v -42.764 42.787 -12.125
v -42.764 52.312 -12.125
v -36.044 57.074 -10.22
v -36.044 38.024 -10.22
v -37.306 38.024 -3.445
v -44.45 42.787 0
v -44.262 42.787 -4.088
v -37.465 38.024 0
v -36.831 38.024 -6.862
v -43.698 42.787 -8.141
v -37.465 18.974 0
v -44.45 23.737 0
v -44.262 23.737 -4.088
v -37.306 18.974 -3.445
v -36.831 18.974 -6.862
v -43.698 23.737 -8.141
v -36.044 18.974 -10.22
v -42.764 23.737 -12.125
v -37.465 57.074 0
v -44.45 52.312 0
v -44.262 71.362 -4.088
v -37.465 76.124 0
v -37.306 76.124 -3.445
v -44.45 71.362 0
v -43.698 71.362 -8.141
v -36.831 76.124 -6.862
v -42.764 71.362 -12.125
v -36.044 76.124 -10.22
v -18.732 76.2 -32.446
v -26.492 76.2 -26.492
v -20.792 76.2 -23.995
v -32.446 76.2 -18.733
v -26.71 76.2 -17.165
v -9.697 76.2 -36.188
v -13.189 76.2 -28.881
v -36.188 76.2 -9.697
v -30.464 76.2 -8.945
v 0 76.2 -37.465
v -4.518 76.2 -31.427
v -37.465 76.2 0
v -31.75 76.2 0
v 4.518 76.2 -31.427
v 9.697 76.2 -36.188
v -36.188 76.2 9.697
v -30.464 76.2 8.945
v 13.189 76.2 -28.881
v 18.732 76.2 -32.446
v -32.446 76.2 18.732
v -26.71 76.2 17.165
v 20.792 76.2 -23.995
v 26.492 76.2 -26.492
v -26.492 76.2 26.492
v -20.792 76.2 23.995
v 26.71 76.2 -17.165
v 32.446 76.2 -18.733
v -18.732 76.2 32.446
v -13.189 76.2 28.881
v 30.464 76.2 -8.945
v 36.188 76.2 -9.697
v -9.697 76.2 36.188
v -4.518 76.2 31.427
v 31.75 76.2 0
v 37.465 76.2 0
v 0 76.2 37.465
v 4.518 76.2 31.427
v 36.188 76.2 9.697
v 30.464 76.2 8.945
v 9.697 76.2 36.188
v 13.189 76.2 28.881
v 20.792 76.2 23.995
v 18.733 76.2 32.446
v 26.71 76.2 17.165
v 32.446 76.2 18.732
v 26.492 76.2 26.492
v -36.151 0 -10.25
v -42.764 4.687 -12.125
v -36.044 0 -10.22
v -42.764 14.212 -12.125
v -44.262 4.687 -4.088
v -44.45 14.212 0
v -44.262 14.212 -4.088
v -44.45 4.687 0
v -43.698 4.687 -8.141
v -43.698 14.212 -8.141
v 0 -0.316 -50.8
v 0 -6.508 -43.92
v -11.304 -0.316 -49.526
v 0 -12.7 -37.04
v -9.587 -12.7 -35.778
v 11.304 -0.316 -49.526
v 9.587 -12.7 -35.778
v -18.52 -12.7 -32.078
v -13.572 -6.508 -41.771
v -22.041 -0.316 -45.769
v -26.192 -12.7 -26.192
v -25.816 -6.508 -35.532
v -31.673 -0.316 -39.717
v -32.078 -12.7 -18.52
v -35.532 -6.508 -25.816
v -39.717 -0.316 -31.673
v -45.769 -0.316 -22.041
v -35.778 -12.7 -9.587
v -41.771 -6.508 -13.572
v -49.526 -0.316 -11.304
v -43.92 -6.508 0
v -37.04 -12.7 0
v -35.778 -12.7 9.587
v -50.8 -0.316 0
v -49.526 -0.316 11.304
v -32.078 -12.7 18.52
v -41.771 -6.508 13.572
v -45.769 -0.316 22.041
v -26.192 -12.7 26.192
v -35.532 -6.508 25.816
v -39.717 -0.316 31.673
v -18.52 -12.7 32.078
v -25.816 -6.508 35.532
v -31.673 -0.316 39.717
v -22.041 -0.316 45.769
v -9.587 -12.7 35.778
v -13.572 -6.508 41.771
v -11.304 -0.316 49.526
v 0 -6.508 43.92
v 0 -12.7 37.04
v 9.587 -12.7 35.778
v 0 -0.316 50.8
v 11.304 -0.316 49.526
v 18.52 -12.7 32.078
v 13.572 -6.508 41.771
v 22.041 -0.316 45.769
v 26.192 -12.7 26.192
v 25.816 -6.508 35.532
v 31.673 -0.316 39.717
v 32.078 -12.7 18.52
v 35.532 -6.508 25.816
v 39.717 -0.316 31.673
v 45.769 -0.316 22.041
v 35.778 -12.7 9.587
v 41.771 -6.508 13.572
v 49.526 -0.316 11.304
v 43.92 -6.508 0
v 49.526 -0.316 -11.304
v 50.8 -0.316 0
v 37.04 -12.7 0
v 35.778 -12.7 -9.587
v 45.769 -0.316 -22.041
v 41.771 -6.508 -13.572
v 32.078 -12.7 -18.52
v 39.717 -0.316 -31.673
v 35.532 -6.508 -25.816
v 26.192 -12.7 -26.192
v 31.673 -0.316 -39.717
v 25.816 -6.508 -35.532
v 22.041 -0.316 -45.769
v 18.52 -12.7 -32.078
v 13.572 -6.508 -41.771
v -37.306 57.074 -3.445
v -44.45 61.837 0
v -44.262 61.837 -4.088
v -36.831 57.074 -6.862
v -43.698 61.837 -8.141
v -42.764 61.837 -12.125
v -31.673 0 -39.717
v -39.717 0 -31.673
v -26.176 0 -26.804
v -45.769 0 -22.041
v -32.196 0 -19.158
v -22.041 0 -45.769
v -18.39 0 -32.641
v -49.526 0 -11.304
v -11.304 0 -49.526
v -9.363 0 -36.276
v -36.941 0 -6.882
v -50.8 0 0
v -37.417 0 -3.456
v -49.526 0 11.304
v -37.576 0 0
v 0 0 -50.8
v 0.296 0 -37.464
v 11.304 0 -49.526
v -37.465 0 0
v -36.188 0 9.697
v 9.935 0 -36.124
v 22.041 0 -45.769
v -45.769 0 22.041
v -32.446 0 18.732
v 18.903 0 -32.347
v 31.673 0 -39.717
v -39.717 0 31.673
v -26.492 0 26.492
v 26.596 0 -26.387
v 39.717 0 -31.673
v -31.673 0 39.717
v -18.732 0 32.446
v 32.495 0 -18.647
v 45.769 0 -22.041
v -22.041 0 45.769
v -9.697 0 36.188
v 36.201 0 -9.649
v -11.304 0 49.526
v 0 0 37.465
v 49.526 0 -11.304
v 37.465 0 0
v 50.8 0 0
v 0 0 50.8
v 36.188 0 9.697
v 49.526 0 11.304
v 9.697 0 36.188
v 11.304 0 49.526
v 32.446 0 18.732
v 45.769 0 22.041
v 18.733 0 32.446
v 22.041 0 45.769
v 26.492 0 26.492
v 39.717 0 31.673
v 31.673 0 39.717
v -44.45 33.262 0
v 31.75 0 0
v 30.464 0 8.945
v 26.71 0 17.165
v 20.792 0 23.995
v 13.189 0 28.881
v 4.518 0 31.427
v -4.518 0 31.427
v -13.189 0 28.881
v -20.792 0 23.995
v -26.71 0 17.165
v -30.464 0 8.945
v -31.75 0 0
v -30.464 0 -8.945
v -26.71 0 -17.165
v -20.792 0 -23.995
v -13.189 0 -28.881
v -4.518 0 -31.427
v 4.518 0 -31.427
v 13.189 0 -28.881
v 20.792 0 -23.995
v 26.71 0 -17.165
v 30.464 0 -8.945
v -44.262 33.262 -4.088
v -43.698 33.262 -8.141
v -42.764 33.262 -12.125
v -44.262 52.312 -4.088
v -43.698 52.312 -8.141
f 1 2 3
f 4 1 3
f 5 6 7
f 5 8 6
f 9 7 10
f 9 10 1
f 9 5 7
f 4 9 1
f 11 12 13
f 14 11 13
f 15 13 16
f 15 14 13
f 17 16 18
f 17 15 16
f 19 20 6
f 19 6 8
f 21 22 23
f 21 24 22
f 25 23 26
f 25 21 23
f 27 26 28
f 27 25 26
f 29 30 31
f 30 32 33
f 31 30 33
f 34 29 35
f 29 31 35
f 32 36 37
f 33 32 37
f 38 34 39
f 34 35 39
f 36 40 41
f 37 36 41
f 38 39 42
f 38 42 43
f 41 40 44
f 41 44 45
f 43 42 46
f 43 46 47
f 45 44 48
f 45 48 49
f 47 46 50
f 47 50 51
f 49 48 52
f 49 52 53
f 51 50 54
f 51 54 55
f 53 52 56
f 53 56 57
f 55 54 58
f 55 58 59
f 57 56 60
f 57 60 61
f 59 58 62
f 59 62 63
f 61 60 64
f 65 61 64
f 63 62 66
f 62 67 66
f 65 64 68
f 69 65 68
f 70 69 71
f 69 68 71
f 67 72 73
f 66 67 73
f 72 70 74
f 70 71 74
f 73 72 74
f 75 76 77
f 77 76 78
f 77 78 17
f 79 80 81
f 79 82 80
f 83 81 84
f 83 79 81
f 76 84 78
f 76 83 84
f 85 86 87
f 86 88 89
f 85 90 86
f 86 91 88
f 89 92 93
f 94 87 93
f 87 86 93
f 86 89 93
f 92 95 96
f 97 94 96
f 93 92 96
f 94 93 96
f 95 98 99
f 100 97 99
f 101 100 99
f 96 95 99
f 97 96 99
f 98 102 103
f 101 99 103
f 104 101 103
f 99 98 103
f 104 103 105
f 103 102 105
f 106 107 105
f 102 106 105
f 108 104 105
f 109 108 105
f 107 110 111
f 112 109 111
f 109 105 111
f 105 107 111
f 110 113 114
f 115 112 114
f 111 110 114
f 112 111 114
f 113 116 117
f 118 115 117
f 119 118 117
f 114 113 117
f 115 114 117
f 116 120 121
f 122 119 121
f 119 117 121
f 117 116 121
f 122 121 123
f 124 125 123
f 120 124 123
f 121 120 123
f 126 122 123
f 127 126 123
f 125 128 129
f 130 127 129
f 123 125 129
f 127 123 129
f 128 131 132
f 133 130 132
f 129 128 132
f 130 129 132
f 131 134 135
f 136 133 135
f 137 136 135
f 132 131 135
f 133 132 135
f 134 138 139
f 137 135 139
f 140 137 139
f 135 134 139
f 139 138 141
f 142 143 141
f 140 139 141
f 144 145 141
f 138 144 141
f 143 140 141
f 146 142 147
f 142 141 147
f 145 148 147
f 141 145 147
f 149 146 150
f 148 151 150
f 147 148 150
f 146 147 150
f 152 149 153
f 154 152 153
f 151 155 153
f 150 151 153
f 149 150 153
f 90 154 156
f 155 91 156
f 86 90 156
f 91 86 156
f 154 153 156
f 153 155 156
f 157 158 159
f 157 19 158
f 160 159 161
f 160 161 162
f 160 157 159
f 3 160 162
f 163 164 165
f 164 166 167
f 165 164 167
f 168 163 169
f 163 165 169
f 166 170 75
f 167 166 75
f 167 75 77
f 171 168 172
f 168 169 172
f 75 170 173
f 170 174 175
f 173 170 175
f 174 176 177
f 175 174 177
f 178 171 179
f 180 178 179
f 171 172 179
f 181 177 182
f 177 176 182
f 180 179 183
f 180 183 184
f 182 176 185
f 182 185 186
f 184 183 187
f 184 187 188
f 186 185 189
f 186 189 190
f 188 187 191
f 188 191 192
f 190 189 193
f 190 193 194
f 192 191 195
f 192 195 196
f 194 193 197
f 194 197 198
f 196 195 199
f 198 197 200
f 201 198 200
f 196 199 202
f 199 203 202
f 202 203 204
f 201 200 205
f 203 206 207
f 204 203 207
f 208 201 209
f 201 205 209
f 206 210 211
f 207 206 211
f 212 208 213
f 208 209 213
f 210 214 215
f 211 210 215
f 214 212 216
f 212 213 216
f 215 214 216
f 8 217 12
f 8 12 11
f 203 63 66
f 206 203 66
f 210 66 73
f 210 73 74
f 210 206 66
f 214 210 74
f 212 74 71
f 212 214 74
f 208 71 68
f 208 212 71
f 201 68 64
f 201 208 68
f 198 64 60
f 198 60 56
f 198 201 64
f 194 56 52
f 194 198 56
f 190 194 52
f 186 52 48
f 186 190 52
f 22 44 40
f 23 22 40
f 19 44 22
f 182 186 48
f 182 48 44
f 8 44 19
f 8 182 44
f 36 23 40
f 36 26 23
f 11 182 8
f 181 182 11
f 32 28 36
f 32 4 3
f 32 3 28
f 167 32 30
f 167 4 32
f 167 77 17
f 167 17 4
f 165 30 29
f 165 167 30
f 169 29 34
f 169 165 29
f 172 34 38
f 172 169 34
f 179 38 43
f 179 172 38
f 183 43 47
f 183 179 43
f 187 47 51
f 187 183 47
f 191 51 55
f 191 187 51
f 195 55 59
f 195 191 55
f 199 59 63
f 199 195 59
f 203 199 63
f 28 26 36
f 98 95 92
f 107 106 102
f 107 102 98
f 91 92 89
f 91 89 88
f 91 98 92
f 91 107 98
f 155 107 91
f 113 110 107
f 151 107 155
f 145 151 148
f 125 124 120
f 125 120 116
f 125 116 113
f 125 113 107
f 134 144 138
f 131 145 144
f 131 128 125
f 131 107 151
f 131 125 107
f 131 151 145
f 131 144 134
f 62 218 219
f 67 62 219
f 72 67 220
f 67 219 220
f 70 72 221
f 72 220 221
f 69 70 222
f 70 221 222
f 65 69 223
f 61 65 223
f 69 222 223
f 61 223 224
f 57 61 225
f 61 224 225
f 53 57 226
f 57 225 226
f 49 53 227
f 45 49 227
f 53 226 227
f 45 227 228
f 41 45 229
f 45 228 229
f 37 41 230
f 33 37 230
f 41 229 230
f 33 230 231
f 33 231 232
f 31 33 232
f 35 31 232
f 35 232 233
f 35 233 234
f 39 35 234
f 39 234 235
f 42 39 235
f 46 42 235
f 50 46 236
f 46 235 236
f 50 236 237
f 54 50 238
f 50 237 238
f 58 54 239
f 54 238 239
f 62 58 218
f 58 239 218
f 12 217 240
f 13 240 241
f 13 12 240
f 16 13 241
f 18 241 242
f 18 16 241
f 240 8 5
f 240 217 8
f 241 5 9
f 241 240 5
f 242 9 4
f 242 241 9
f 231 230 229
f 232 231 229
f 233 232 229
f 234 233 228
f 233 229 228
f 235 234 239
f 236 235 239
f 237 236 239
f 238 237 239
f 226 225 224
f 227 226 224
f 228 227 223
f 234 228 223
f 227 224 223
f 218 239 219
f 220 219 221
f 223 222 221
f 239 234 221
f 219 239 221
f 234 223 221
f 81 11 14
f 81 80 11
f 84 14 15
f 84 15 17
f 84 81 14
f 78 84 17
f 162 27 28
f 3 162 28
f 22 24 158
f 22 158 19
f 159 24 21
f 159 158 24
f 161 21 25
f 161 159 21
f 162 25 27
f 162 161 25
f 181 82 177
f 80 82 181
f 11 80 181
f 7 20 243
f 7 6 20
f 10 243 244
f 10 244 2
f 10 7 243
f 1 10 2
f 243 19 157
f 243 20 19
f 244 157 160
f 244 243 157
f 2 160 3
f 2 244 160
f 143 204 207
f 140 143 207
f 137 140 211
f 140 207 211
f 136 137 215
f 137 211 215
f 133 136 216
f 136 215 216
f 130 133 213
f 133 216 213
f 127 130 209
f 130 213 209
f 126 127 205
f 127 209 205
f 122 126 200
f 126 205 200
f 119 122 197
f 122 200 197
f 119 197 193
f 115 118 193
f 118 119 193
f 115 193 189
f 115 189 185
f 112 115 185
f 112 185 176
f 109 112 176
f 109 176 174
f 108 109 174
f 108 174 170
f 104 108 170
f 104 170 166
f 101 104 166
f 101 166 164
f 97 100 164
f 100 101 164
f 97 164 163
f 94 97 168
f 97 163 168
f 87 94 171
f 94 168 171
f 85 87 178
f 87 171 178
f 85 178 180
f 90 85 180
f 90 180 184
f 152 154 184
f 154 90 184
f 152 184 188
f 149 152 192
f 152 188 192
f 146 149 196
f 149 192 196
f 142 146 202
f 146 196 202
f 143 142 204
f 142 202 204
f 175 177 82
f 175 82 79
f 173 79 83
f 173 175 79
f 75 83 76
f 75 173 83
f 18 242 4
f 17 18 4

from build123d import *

# Parameters (mm, degrees)
F0_R     = 50.8
F1_DEPTH = 12.7
F4_DEPTH = 25.4
F5_R     = 37.465
F5_R_2   = 31.75
F6_DEPTH = 76.2
F8_ANGLE = 15.83


with BuildPart() as f1:
    # F0 (on Front) → F1 (new body)
    with BuildSketch(Plane.XZ):
        Circle(F0_R)
    extrude(amount=F1_DEPTH)

    # F2 (on Right) → F3 (revolve, cut)
    with BuildSketch(Plane.YZ):
        Polygon((-12.895335, -50.86495), (0, -51.151514), (-12.895335, -36.823358), align=None)
    revolve(axis=Axis((0, 0, 0), (0, 1, 0)), mode=Mode.SUBTRACT)

    # F2 (on Right) → F4 (cut)
    with BuildSketch(Plane.YZ):
        Polygon((-12.895335, -50.86495), (0, -51.151514), (-12.895335, -36.823358), align=None)
    extrude(amount=-F4_DEPTH, mode=Mode.SUBTRACT)

    # F5 (on Front) → F6 (join)
    with BuildSketch(Plane.XZ):
        Circle(F5_R)
        Circle(F5_R_2, mode=Mode.SUBTRACT)
    extrude(amount=-F6_DEPTH)

    # F7 (on Top) → F8 (revolve)
    with BuildSketch(Plane.XY):
        Polygon((-37.465, -0.075845), (-37.465, 18.974155), (-44.45, 14.211659), (-44.45, 4.686659), align=None)
        Polygon((-37.465, 18.974155), (-37.465, 38.024155), (-44.45, 33.261659), (-44.45, 23.736659), align=None)
        Polygon((-37.465, 38.024155), (-37.465, 57.074155), (-44.45, 52.311659), (-44.45, 42.786659), align=None)
        Polygon((-37.465, 57.074155), (-37.465, 76.124155), (-44.45, 71.361659), (-44.45, 61.836659), align=None)
    revolve(axis=Axis((0, 76.2, 0), (0, -1, 0)), revolution_arc=F8_ANGLE)


solid = f1.part
